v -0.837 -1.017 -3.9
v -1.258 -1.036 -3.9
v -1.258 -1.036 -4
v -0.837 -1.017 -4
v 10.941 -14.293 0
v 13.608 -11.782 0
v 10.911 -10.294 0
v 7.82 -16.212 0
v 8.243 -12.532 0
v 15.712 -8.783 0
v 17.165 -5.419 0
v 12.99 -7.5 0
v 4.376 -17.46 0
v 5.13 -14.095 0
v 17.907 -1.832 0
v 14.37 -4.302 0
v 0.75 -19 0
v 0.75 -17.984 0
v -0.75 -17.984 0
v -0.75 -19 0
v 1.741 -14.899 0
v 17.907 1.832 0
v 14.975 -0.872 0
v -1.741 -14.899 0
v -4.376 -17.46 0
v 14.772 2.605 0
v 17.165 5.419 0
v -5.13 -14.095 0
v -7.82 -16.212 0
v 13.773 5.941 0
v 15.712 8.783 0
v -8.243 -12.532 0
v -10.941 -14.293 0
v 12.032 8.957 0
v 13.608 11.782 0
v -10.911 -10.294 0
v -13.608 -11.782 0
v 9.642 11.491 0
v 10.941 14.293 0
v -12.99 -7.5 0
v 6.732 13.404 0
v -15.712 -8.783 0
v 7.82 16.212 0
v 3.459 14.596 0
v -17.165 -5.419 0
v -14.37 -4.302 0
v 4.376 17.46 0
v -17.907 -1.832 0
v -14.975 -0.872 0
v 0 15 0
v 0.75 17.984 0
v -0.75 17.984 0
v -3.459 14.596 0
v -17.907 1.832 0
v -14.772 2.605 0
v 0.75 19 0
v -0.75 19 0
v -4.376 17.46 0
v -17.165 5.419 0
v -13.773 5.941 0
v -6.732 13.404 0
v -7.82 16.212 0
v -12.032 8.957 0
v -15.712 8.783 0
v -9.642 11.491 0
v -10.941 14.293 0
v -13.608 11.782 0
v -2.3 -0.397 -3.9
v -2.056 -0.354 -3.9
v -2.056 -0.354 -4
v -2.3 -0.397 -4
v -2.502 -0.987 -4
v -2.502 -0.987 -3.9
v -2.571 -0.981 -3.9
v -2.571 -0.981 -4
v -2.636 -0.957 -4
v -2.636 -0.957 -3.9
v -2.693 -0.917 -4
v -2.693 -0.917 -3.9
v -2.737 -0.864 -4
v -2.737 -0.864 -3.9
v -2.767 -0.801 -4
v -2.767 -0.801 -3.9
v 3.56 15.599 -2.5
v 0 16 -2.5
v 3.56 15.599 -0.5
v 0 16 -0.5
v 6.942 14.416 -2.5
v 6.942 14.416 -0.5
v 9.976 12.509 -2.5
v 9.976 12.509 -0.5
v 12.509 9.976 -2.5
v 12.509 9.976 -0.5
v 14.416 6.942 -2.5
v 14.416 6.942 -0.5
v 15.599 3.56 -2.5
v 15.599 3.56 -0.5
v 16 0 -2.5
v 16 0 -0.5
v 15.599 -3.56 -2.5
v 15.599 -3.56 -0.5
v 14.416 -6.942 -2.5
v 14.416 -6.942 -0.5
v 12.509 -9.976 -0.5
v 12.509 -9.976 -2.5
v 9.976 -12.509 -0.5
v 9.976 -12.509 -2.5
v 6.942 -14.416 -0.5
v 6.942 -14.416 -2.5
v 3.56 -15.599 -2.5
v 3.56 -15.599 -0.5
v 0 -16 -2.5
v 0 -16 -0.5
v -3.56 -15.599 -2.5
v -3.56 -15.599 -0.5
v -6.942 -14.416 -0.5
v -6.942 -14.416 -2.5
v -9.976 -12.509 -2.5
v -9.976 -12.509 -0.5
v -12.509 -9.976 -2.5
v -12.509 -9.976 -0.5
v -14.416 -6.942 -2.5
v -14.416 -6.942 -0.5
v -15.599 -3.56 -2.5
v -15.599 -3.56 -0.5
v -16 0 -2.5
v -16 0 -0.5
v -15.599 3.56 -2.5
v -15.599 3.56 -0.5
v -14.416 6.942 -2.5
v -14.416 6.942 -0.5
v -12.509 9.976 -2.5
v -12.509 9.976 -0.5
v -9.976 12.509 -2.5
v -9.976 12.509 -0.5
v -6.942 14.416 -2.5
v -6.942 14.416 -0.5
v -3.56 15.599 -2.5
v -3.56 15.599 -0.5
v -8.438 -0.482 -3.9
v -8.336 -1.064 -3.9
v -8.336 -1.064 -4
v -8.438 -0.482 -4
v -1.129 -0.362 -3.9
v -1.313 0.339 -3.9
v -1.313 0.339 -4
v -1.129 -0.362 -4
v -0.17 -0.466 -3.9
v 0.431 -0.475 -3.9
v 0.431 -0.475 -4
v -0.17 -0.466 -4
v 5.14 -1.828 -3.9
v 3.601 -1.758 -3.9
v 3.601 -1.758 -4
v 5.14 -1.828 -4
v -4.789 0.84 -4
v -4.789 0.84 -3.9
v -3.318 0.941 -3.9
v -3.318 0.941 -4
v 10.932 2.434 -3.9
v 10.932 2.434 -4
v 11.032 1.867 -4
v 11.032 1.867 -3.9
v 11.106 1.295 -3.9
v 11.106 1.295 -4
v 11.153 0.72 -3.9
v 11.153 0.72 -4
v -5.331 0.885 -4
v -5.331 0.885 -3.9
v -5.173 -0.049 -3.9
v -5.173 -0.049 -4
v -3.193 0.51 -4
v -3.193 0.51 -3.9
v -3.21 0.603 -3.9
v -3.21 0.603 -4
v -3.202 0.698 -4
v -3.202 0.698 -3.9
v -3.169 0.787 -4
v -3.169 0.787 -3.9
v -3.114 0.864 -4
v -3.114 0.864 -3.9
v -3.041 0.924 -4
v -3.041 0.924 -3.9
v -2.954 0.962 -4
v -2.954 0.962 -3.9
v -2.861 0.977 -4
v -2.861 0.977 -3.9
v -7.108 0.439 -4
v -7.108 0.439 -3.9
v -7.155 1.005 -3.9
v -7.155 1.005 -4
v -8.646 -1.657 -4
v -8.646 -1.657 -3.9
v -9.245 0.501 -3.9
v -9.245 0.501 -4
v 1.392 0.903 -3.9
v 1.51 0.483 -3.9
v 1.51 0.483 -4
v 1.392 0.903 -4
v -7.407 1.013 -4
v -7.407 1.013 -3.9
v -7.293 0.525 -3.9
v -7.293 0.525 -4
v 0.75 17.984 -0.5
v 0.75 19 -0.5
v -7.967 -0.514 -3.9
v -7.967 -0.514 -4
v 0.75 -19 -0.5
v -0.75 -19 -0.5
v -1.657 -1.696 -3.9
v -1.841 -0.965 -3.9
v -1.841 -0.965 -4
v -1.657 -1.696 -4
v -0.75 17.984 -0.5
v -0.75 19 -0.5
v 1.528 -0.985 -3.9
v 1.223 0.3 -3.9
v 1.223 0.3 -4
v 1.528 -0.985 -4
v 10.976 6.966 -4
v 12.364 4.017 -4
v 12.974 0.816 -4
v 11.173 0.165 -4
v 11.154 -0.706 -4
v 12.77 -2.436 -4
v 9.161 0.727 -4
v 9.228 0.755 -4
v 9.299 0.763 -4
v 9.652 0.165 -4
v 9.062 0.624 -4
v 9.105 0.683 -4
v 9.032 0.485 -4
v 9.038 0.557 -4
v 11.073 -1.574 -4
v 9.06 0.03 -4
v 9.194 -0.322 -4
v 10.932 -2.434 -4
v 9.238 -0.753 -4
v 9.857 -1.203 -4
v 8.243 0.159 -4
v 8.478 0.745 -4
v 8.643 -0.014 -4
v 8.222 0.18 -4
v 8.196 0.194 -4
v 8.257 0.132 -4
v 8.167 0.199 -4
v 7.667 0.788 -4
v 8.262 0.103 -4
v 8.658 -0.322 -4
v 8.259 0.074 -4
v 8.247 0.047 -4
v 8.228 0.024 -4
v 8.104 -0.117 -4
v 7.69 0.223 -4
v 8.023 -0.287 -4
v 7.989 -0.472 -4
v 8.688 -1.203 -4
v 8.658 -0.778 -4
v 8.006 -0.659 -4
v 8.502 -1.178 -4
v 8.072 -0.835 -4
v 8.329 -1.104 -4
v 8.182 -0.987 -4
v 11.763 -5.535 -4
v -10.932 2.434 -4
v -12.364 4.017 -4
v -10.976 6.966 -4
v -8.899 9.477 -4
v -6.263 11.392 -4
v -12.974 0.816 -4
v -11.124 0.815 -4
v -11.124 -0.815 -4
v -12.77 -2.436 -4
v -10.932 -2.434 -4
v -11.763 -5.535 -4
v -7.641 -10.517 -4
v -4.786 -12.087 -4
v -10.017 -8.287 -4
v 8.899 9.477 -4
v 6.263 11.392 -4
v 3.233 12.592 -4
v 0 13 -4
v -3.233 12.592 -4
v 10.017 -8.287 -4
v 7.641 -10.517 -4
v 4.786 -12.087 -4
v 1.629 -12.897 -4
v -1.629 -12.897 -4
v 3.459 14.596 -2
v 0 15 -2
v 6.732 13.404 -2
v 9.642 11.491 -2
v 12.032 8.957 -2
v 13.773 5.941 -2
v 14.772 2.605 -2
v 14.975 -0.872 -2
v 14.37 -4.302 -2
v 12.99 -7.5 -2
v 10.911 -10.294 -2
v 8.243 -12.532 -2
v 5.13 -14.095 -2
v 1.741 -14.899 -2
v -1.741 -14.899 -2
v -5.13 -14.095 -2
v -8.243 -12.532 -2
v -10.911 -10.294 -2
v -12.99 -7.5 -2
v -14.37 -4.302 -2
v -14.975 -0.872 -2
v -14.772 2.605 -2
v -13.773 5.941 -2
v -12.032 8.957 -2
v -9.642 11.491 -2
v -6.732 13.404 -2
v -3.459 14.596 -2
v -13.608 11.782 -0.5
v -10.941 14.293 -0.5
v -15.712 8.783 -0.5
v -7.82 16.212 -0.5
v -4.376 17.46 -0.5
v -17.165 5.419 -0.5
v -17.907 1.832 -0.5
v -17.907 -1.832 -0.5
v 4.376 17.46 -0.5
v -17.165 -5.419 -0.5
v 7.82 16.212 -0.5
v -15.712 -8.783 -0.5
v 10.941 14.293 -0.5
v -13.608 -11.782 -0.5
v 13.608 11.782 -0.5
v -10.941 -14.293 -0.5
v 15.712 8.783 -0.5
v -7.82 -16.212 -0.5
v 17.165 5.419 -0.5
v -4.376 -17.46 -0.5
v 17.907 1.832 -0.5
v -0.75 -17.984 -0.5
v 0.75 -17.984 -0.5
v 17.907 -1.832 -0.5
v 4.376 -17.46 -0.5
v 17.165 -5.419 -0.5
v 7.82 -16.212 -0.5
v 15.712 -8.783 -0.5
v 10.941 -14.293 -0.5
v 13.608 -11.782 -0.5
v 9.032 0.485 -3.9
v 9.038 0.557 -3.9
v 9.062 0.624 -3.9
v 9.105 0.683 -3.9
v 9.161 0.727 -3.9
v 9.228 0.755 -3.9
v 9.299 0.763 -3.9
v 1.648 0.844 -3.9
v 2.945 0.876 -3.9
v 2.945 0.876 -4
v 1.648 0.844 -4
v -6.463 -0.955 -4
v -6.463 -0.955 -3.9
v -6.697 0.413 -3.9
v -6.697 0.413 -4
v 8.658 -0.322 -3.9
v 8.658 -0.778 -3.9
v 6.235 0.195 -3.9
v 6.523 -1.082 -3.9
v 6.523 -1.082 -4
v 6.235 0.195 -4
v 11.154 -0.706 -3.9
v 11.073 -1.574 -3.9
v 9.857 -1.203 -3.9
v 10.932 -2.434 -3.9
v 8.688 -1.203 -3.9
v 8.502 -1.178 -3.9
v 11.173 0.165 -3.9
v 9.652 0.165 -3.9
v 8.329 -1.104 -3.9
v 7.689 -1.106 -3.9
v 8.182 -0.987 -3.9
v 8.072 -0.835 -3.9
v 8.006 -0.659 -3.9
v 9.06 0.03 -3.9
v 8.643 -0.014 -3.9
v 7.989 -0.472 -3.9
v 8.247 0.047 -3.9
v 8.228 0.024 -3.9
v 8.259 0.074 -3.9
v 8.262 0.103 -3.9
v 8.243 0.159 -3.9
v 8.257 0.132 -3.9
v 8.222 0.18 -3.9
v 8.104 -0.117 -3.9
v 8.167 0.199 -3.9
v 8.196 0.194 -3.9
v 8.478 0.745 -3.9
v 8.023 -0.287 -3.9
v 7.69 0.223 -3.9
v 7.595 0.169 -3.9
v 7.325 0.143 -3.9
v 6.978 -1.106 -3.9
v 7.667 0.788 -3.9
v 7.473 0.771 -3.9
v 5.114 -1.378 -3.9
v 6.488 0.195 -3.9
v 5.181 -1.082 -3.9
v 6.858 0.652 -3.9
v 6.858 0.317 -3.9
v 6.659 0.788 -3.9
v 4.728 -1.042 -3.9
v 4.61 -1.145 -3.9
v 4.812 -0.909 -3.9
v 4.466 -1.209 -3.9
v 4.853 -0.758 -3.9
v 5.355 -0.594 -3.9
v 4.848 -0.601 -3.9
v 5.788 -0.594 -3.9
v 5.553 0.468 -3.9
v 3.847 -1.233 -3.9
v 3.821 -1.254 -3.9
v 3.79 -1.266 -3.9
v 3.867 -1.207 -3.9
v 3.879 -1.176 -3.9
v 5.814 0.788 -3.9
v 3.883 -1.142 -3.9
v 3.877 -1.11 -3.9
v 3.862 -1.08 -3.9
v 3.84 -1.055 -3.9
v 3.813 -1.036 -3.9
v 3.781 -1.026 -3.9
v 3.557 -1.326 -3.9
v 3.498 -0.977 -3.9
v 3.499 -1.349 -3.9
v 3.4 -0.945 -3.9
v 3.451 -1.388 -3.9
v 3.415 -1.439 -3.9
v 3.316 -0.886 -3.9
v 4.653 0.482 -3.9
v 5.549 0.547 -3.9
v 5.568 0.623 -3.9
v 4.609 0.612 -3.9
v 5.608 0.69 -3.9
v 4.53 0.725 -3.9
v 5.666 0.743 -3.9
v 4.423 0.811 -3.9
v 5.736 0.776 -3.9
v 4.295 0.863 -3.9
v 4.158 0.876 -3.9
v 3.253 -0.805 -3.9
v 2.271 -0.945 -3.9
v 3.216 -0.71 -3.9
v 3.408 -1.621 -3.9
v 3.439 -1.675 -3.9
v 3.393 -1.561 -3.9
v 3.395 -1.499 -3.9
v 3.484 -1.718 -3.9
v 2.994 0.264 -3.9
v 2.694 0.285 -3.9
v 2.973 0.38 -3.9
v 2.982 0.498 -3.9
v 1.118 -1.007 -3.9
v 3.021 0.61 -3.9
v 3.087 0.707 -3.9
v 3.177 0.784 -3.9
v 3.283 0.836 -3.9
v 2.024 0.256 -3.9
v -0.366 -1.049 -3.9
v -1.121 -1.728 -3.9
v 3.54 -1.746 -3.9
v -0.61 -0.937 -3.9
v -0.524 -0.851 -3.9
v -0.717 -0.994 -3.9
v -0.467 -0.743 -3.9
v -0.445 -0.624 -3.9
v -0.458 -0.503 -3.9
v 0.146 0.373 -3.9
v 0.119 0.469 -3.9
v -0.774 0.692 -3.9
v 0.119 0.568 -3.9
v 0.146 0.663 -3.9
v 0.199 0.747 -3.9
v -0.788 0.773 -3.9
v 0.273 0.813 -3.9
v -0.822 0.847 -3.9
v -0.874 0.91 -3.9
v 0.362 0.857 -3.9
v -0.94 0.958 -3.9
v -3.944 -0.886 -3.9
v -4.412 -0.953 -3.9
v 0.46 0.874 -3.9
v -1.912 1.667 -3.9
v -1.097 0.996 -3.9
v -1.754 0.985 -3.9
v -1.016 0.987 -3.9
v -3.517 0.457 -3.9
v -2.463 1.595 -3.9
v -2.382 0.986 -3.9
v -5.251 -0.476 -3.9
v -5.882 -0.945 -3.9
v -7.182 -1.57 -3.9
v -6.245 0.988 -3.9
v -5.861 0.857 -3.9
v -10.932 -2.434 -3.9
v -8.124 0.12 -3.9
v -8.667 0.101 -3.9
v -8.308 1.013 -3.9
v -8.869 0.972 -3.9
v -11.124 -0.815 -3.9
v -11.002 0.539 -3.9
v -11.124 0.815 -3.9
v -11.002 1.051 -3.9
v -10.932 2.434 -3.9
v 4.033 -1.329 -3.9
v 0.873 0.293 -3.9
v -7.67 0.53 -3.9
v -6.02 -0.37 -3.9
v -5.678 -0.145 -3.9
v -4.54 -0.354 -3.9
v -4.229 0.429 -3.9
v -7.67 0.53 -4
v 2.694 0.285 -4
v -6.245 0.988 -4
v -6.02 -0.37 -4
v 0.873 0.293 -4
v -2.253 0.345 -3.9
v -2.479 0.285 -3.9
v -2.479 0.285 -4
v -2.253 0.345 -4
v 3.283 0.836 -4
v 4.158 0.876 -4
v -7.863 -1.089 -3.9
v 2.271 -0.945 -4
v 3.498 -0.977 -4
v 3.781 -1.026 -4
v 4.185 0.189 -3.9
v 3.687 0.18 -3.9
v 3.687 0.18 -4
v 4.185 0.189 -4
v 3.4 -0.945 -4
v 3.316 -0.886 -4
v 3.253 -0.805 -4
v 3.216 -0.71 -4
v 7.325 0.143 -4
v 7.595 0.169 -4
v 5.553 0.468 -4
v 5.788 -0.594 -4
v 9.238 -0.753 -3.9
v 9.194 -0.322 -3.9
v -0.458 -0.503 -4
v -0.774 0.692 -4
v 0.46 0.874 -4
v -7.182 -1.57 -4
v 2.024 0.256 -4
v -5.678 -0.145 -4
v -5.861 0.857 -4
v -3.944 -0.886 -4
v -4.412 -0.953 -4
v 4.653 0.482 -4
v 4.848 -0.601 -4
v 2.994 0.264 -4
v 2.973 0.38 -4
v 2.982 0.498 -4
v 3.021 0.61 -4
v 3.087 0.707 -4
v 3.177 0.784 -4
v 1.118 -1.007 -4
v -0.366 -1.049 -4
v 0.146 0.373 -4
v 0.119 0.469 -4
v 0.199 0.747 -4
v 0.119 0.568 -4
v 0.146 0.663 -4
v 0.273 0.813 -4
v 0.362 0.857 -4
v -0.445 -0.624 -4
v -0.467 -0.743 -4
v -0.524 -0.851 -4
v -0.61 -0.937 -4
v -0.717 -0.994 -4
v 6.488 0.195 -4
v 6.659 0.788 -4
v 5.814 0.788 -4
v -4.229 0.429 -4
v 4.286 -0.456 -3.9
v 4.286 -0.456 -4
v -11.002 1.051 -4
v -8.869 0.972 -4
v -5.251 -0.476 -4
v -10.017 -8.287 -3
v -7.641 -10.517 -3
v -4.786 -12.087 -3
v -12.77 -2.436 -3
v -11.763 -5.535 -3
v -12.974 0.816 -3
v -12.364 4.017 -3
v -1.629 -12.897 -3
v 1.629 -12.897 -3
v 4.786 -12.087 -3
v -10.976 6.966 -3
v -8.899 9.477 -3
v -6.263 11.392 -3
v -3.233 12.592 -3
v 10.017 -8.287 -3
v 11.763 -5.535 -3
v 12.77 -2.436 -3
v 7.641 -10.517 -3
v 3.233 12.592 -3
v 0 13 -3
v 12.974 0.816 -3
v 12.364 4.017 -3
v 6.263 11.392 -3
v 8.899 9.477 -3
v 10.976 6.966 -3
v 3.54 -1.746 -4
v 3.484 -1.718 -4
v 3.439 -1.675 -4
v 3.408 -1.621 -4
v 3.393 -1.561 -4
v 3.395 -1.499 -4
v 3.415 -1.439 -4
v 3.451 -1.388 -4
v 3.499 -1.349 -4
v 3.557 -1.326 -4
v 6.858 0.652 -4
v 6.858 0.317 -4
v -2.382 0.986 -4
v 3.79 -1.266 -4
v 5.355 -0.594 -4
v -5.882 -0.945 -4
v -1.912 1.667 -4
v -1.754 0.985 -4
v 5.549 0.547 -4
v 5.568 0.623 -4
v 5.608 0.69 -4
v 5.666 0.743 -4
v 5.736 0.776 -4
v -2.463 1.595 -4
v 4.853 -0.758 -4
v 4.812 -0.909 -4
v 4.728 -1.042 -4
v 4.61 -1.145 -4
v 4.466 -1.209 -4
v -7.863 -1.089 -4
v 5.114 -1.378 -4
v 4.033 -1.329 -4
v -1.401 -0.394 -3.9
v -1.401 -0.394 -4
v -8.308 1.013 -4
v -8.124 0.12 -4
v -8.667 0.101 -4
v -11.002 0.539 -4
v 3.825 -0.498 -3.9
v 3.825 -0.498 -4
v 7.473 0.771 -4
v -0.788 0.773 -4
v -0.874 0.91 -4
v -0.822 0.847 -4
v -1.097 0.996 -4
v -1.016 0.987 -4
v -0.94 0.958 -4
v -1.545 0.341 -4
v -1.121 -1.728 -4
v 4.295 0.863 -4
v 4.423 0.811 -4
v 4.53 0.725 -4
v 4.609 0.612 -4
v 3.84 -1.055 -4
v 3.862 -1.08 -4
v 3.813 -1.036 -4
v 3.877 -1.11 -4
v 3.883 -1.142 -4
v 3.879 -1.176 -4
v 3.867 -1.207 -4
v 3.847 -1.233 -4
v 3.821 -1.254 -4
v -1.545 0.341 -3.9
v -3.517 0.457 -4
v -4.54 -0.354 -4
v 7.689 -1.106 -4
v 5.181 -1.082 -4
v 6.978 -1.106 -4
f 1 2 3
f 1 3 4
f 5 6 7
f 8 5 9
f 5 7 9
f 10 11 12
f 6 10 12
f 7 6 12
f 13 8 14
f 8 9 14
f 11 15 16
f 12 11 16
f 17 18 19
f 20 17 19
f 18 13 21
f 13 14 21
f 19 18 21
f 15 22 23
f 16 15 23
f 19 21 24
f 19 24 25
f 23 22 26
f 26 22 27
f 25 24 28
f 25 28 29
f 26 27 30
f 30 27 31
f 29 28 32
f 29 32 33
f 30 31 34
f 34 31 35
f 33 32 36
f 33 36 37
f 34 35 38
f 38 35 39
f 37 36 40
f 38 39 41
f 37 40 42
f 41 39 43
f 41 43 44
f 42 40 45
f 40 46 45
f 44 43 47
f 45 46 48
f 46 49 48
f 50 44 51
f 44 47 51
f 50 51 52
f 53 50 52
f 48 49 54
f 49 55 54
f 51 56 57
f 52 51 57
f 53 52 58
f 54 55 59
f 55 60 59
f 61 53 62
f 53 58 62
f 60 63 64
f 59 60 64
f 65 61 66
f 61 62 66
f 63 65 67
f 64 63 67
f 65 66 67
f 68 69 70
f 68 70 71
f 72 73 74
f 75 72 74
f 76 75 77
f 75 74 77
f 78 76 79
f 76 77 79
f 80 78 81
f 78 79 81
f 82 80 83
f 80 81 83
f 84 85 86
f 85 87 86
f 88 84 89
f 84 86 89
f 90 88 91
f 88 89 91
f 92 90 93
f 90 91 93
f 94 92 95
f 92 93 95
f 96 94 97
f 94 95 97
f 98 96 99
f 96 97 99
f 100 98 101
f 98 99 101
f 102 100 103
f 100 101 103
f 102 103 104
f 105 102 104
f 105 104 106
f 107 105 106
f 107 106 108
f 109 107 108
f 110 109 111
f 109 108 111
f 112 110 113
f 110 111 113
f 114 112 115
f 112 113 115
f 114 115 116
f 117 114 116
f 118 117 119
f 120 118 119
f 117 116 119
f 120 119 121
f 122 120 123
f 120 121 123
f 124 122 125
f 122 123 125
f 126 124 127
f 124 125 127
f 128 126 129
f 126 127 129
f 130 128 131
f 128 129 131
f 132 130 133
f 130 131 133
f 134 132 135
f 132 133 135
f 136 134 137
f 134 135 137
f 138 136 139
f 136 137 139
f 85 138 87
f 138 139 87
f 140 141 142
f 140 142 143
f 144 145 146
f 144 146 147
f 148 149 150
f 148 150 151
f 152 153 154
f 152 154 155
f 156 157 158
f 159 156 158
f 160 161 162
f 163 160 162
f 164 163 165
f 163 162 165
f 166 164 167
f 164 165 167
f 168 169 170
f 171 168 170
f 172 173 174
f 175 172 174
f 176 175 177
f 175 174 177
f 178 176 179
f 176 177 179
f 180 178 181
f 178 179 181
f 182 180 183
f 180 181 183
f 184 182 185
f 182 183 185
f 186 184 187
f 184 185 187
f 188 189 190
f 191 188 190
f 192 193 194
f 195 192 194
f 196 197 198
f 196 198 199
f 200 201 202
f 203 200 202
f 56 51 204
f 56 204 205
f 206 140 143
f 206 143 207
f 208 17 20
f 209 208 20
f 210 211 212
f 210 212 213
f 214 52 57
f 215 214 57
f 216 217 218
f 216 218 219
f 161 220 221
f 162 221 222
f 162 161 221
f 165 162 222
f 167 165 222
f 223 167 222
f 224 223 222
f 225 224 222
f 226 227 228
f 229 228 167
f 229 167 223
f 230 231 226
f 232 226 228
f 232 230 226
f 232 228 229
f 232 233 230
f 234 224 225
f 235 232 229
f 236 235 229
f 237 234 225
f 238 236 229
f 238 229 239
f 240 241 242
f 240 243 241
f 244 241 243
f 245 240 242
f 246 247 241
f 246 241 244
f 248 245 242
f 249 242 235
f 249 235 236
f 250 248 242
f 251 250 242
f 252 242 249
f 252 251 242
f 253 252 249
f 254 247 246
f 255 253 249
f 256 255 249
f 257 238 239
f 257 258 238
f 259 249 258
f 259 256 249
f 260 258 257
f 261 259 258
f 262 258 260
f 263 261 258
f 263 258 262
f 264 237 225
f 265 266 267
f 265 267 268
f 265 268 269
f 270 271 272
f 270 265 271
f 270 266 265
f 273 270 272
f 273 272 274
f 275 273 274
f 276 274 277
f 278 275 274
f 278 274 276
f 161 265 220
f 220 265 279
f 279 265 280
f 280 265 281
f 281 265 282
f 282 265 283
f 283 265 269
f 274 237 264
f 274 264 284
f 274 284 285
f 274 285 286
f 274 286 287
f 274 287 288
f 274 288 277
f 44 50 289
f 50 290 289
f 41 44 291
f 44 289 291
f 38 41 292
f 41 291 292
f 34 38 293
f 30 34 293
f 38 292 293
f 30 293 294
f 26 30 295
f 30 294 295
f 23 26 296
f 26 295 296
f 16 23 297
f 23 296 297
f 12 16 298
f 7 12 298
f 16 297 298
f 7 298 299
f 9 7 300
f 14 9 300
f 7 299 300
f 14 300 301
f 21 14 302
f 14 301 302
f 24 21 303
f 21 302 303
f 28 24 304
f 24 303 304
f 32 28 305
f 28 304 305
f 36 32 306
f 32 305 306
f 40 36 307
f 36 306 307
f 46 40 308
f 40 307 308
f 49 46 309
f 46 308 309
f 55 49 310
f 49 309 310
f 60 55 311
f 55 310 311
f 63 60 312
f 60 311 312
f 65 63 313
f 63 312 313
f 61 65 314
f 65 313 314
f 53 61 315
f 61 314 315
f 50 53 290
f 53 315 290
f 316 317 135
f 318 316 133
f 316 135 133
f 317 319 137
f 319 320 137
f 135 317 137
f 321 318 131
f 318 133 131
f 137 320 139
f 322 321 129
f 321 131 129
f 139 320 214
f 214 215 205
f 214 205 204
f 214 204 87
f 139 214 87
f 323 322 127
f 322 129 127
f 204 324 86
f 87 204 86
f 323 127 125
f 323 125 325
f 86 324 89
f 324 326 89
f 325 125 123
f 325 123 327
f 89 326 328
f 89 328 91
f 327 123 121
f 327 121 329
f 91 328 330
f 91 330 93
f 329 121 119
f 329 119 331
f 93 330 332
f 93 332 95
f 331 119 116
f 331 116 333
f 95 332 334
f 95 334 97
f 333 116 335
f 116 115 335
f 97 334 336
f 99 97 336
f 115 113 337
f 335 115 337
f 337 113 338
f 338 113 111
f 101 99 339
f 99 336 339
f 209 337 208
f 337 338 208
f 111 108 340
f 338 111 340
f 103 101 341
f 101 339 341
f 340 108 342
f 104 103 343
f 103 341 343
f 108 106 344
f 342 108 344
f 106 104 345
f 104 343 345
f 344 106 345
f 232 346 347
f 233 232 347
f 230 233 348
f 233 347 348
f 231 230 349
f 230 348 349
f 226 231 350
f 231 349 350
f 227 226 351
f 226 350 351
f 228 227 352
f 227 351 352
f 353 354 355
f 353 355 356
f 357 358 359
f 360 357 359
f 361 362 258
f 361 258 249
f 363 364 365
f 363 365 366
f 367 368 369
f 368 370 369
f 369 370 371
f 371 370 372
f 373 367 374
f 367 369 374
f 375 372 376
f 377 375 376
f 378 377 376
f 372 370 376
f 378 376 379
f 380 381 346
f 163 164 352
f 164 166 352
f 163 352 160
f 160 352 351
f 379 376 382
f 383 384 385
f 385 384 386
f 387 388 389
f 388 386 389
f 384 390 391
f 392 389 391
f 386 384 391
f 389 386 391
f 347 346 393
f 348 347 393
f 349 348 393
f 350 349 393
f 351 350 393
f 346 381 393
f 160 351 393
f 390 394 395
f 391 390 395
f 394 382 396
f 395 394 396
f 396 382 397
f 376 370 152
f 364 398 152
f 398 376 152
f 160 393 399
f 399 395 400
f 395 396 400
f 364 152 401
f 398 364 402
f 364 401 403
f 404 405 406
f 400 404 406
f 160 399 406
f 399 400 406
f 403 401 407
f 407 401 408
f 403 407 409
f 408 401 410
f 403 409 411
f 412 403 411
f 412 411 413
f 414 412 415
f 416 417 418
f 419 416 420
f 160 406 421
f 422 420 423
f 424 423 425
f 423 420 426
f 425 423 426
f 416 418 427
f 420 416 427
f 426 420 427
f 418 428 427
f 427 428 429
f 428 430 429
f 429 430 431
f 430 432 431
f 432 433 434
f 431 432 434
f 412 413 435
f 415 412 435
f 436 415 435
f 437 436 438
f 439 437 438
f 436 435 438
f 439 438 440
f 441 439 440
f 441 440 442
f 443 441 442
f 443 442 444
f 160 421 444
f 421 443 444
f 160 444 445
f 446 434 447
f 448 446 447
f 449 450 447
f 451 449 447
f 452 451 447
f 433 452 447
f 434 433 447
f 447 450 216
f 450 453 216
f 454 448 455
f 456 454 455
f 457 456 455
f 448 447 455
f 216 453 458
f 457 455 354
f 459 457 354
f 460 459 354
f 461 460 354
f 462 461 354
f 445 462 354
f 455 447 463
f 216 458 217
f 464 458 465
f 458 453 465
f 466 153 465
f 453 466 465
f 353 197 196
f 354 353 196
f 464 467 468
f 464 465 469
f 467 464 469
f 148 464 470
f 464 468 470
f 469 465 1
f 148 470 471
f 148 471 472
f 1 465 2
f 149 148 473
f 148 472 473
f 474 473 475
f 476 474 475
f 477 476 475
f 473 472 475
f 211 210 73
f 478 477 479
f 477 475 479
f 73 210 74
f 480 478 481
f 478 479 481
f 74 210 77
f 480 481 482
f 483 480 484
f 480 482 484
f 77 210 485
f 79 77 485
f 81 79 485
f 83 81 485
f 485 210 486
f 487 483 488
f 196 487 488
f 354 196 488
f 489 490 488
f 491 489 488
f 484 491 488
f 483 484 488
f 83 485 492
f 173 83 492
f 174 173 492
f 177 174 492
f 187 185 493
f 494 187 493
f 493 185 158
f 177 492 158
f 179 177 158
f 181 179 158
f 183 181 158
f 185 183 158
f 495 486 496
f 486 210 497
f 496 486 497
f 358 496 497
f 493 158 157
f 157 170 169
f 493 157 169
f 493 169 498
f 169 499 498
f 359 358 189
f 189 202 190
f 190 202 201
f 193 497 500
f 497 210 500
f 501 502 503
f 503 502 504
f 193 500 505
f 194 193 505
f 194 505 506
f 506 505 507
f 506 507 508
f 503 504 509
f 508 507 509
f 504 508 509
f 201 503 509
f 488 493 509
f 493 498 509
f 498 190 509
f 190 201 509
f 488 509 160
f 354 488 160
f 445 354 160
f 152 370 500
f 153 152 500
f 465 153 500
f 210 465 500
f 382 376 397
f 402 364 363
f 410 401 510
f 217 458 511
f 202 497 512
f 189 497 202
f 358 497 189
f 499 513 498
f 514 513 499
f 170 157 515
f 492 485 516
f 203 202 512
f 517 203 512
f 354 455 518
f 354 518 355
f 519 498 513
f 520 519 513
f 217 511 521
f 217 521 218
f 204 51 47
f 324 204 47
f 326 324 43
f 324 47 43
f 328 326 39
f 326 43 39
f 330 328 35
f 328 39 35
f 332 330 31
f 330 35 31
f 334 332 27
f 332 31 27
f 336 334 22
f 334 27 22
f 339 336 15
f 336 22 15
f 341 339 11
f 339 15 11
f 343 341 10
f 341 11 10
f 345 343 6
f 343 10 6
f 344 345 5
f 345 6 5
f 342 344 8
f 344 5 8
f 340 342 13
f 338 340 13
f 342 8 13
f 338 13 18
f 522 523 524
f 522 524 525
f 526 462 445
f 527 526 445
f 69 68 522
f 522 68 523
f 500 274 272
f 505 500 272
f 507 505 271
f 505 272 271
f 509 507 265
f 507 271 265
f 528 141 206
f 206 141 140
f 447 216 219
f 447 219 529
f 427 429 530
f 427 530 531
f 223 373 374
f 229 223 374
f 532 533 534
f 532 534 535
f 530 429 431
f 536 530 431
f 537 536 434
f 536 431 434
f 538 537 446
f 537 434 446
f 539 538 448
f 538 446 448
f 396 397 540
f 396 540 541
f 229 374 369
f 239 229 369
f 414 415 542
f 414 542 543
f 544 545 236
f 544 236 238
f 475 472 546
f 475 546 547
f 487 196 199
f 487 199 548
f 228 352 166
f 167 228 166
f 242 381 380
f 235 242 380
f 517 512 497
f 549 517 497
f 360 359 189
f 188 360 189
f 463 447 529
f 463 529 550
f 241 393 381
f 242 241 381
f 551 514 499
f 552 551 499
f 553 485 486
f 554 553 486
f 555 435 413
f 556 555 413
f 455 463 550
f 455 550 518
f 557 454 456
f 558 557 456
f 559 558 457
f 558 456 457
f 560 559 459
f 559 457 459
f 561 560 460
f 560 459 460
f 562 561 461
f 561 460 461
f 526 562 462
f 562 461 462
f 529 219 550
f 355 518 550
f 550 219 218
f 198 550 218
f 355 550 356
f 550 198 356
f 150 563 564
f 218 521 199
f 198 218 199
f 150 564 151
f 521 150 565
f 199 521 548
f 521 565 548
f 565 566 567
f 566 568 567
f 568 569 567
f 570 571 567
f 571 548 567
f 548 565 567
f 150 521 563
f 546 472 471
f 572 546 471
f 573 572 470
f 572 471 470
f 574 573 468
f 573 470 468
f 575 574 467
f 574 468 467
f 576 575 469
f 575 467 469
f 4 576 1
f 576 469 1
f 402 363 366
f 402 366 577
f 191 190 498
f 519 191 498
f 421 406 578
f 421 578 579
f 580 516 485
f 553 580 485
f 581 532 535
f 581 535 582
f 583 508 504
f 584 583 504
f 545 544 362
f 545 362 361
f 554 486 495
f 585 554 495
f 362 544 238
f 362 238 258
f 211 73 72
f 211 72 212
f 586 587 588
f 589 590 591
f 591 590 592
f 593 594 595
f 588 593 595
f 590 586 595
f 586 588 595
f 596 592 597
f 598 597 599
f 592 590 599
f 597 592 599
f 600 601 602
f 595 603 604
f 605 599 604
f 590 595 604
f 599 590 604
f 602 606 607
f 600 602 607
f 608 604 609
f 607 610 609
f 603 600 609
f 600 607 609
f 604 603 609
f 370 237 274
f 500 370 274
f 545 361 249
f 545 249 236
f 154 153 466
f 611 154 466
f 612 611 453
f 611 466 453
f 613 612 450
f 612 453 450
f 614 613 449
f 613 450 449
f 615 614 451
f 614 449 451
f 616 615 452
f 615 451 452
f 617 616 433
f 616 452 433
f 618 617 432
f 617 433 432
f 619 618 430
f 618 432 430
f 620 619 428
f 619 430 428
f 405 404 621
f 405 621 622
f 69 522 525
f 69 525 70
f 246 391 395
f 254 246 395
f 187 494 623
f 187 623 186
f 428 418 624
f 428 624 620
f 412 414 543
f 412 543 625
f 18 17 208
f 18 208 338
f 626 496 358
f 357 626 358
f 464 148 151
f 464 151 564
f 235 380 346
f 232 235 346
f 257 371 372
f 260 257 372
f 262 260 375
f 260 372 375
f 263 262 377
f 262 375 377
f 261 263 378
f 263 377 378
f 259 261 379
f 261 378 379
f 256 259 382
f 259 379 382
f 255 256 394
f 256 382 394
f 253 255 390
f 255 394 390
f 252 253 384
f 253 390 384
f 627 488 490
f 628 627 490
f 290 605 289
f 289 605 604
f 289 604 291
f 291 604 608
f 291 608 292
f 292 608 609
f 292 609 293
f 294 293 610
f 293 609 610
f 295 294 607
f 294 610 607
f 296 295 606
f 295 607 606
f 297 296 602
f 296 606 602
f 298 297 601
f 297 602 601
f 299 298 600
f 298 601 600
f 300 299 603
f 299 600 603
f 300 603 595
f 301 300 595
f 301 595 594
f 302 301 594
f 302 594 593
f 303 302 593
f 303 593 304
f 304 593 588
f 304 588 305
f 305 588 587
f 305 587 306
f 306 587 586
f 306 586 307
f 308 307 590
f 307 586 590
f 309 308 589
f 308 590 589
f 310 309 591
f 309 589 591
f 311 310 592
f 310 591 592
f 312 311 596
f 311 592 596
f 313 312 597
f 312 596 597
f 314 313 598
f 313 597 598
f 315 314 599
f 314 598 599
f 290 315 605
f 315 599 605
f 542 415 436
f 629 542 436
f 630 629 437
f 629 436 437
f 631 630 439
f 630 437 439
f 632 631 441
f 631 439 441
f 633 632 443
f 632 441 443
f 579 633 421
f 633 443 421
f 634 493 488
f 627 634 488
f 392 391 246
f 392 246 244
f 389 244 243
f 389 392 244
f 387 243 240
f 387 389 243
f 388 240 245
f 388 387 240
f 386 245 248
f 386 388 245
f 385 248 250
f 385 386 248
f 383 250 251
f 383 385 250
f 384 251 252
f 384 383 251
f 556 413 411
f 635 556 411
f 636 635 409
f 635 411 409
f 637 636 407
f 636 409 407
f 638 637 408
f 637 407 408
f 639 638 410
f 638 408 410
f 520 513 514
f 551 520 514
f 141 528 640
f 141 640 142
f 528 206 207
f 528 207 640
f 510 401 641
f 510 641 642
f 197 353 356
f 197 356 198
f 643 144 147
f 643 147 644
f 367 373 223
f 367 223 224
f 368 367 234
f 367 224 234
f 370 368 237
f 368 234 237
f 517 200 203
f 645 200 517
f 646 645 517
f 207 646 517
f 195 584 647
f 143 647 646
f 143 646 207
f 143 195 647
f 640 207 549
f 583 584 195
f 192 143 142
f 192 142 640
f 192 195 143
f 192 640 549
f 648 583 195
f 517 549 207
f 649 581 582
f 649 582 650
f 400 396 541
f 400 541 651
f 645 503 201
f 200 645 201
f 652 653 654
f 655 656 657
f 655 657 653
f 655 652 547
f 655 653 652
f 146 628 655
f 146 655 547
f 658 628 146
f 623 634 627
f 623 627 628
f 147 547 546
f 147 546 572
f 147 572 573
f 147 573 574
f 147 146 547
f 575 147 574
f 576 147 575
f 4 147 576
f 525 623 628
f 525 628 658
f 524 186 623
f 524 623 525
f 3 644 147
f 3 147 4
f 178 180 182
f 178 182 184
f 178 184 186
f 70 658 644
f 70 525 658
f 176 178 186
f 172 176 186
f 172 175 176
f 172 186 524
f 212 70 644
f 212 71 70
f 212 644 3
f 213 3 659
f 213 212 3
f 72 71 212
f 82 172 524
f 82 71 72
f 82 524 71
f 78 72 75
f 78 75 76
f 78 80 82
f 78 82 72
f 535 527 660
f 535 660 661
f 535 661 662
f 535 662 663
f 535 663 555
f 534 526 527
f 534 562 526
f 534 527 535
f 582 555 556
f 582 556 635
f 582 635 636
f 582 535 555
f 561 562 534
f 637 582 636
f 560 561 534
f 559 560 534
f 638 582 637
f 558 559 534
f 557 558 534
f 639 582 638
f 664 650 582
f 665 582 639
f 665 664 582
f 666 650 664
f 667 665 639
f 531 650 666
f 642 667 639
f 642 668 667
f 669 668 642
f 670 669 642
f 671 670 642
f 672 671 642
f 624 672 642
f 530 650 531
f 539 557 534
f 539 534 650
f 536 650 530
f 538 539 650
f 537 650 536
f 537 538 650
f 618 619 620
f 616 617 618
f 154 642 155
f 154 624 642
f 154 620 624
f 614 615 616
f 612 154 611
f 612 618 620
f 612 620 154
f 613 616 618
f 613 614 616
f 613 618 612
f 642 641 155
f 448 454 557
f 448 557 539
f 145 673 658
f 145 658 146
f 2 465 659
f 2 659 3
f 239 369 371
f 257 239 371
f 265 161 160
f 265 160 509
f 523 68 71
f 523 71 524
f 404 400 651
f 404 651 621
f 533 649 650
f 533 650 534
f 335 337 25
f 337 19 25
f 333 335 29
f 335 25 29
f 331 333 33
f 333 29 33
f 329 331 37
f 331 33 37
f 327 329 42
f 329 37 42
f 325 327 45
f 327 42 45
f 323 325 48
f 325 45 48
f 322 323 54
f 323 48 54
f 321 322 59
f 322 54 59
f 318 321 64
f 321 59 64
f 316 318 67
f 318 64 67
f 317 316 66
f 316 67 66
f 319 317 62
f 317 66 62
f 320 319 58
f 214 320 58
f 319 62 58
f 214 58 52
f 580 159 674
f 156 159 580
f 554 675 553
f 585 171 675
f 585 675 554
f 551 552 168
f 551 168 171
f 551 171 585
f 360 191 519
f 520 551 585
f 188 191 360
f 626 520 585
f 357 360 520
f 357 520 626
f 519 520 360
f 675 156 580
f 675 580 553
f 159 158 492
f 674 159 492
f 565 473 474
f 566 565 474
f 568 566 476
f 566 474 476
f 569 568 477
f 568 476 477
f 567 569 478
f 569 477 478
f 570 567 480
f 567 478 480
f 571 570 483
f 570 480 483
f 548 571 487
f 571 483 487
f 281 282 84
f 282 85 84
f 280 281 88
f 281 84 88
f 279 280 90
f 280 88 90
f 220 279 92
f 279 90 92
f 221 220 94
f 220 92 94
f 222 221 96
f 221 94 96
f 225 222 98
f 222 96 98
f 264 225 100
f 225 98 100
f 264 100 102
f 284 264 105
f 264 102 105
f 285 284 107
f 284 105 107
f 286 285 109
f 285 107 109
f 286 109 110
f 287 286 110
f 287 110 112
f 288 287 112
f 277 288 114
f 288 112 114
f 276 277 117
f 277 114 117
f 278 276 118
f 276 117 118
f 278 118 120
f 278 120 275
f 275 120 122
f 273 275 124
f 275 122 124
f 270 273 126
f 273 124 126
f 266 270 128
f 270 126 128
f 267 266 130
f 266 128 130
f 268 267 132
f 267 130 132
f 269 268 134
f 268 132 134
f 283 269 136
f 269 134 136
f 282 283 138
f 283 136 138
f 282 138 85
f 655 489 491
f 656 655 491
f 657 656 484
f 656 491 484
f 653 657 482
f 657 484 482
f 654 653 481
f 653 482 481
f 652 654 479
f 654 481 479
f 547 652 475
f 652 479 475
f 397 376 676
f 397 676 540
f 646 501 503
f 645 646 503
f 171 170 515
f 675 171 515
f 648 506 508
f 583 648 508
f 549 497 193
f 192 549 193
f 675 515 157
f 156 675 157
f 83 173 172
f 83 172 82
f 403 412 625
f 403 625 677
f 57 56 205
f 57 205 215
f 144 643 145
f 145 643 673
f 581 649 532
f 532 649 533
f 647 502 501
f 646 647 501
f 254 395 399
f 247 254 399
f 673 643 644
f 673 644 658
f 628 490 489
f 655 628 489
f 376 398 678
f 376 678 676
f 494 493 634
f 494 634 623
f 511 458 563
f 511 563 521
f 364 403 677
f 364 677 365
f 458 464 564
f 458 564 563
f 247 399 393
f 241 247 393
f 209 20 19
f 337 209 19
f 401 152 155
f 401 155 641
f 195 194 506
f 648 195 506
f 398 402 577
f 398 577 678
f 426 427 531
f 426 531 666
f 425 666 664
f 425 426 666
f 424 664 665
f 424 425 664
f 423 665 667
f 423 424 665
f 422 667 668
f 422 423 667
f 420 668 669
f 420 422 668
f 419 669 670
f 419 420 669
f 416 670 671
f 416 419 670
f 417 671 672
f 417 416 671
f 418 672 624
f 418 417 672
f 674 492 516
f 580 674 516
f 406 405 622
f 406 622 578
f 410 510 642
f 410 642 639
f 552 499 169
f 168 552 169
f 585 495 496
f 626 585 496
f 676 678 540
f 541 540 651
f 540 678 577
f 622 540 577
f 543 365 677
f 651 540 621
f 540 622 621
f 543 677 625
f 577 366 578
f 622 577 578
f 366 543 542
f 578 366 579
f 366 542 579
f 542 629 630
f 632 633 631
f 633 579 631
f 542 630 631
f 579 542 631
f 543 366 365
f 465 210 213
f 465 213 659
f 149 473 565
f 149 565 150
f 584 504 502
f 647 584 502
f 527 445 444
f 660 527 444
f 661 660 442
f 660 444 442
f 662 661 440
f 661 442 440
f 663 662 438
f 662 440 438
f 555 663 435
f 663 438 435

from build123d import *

# Parameters (mm, degrees)
SKETCH019_W             = 1.5
SKETCH019_H             = 1.25
PAD002_DEPTH            = 0.5
POCKET_DEPTH            = 0.1
PAD_DEPTH               = 0.1
BODY002_PLACEMENT_ANGLE = 180


with BuildPart() as part:
    # Sketch018 → Revolution002 (revolve)
    with BuildSketch(Plane.YZ):
        Polygon((0, 3), (0, 4), (13, 4), (16, 2.5), (16, 0.5), (18, 0.5), (18, 0), (15, 0), (15, 2), (13, 3), align=None)
    revolve(axis=Axis((0, 0, 0), (0, 0, 1)))

    # Sketch019 → Pad002 (new body)
    with BuildSketch(Plane.XY):
        with Locations((0, 18.375)):
            Rectangle(SKETCH019_W, SKETCH019_H)
        with Locations((0, -18.375)):
            Rectangle(SKETCH019_W, SKETCH019_H)
    extrude(amount=PAD002_DEPTH)

    # Sketch020 (on Face10 of Pad002) → Pocket (cut)
    with BuildSketch(Plane(origin=(0, 0, 4), x_dir=(0, -1, 0), z_dir=(0, 0, 1))):
        with BuildLine():
            Line((-2.434491, -10.93226), (-2.434491, 10.93226))
            ThreePointArc((2.434491, 10.93226), (0, 11.148441), (-2.434491, 10.93226))
            Line((2.434491, -10.93226), (2.434491, 10.93226))
            ThreePointArc((-2.434491, -10.93226), (0, -11.17381), (2.434491, -10.93226))
        make_face()
    extrude(amount=-POCKET_DEPTH, mode=Mode.SUBTRACT)

    # Sketch021 (on Face21 of Pocket) → Pad (join)
    with BuildSketch(Plane(origin=(0, 0, 3.9), x_dir=(0, -1, 0), z_dir=(0, 0, 1))):
        Polygon((-1.051088, 11.002361), (-0.972425, 8.869409), (-0.10063, 8.667482), (-0.120028, 8.124363), (-1.012698, 8.308082), (-1.012698, 7.40667), (-0.525367, 7.293473), (-0.530311, 7.669809), (1.570168, 7.181732), (1.657325, 8.645967), (-0.50107, 9.244894), (-0.538989, 11.002361), align=None)
        Polygon((0.481582, 8.438001), (0.513538, 7.966647), (1.08875, 7.862789), (1.064194, 8.335846), align=None, mode=Mode.SUBTRACT)
        Polygon((-1.004575, 7.154918), (-0.988205, 6.244779), (0.36954, 6.020473), (0.144834, 5.678259), (-0.85747, 5.861289), (-0.8847, 5.331025), (0.048961, 5.17275), (0.353603, 4.54011), (-0.840038, 4.78926), (-0.940623, 3.317786), (-0.456548, 3.51677), (-0.429325, 4.228536), (0.885667, 3.943839), (0.952781, 4.412285), (0.476029, 5.251191), (0.944792, 5.882269), (0.955392, 6.46267), (-0.413346, 6.697153), (-0.439117, 7.107631), align=None)
        with BuildLine():
            Line((-1.595326, 2.463415), (-1.667228, 1.912171))
            Line((-1.667228, 1.912171), (-0.98497, 1.753897))
            Line((-0.98497, 1.753897), (-0.996148, 1.097288))
            ThreePointArc((-0.996148, 1.097288), (-0.909931, 0.873883), (-0.692449, 0.773661))
            Line((0.502626, 0.457906), (-0.692449, 0.773661))
            ThreePointArc((0.502626, 0.457906), (0.850751, 0.524173), (1.017488, 0.836872))
            Line((1.035793, 1.257814), (1.017488, 0.836872))
            Line((1.728117, 1.121255), (1.035793, 1.257814))
            Line((1.696161, 1.656521), (1.728117, 1.121255))
            Line((0.964921, 1.841128), (1.696161, 1.656521))
            Line((0.987336, 2.501678), (0.964921, 1.841128))
            ThreePointArc((0.987336, 2.501678), (0.938708, 2.665418), (0.801388, 2.766999))
            Line((-0.509837, 3.193234), (0.801388, 2.766999))
            ThreePointArc((-0.509837, 3.193234), (-0.8271, 3.14454), (-0.976837, 2.860628))
            Line((-0.98581, 2.38212), (-0.976837, 2.860628))
            Line((-1.595326, 2.463415), (-0.98581, 2.38212))
        make_face()
        Polygon((-0.285122, 2.479393), (-0.344921, 2.25341), (0.354001, 2.055974), (0.39705, 2.300148), align=None, mode=Mode.SUBTRACT)
        Polygon((-0.341045, 1.544675), (-0.339079, 1.3128), (0.361991, 1.129244), (0.393947, 1.400872), align=None, mode=Mode.SUBTRACT)
        with BuildLine():
            Line((-0.373136, -0.145754), (0.474852, -0.431454))
            Line((0.474852, -0.431454), (0.466107, 0.169897))
            Line((0.466107, 0.169897), (1.048914, 0.365545))
            Line((1.048914, 0.365545), (1.007425, -1.117984))
            Line((1.007425, -1.117984), (-0.293246, -0.872757))
            Line((-0.293246, -0.872757), (-0.299928, -1.222572))
            Line((-0.299928, -1.222572), (0.985002, -1.527859))
            Line((0.985002, -1.527859), (0.945056, -2.27084))
            Line((0.945056, -2.27084), (-0.256349, -2.024415))
            Line((-0.256349, -2.024415), (-0.285257, -2.69426))
            Line((-0.285257, -2.69426), (-0.876366, -2.944678))
            Line((-0.876366, -2.944678), (-0.84449, -1.647695))
            Line((-0.84449, -1.647695), (-0.482957, -1.510189))
            Line((-0.482957, -1.510189), (-0.903417, -1.392168))
            Line((-0.903417, -1.392168), (-0.873512, -0.459889))
            ThreePointArc((-0.373136, -0.145754), (-0.706912, -0.169676), (-0.873512, -0.459889))
        make_face()
        with BuildLine():
            Line((-0.836017, -3.282908), (-0.876294, -4.157938))
            ThreePointArc((-0.876294, -4.157938), (-0.771967, -4.479652), (-0.481546, -4.652971))
            Line((-0.481546, -4.652971), (0.600982, -4.848248))
            ThreePointArc((0.600982, -4.848248), (0.978895, -4.775046), (1.208734, -4.466256))
            Line((1.328705, -4.032862), (1.208734, -4.466256))
            Line((1.377683, -5.114136), (1.328705, -4.032862))
            Line((1.827564, -5.140406), (1.377683, -5.114136))
            Line((1.757688, -3.601044), (1.827564, -5.140406))
            ThreePointArc((1.757688, -3.601044), (1.560758, -3.392599), (1.325631, -3.556752))
            Line((1.266093, -3.790237), (1.325631, -3.556752))
            ThreePointArc((1.026349, -3.780899), (1.142446, -3.882509), (1.266093, -3.790237))
            Line((0.977187, -3.497595), (1.026349, -3.780899))
            ThreePointArc((0.977187, -3.497595), (0.886029, -3.316179), (0.709587, -3.21573))
            Line((-0.263959, -2.994211), (0.709587, -3.21573))
            ThreePointArc((-0.263959, -2.994211), (-0.609501, -3.020633), (-0.836017, -3.282908))
        make_face()
        Polygon((-0.179772, -3.687321), (-0.189214, -4.184654), (0.456341, -4.285789), (0.497845, -3.825146), align=None, mode=Mode.SUBTRACT)
        with BuildLine():
            Line((-0.468422, -5.552885), (0.594216, -5.787834))
            Line((0.594216, -5.787834), (0.594216, -5.355098))
            Line((0.594216, -5.355098), (1.081549, -5.180666))
            Line((1.081549, -5.180666), (1.081549, -6.522826))
            Line((1.081549, -6.522826), (-0.195384, -6.235382))
            Line((-0.195384, -6.235382), (-0.195384, -6.488137))
            Line((-0.195384, -6.488137), (1.105516, -6.978201))
            Line((1.105516, -6.978201), (1.105516, -7.689227))
            Line((1.105516, -7.689227), (-0.14309, -7.324843))
            Line((-0.14309, -7.324843), (-0.169237, -7.595029))
            Line((-0.169237, -7.595029), (-0.770619, -7.47301))
            Line((-0.770619, -7.47301), (-0.652075, -6.858366))
            Line((-0.652075, -6.858366), (-0.317403, -6.858366))
            Line((-0.317403, -6.858366), (-0.787888, -6.658639))
            Line((-0.787888, -6.658639), (-0.787888, -5.814008))
            ThreePointArc((-0.468422, -5.552885), (-0.690064, -5.607705), (-0.787888, -5.814008))
        make_face()
        with BuildLine():
            Line((-0.788226, -7.667088), (-0.744648, -8.477647))
            Line((-0.744648, -8.477647), (0.013617, -8.643245))
            Line((0.013617, -8.643245), (-0.029888, -9.060359))
            Line((-0.029888, -9.060359), (-0.485137, -9.032119))
            ThreePointArc((-0.485137, -9.032119), (-0.682705, -9.10468), (-0.76291, -9.299271))
            Line((-0.76291, -9.299271), (-0.718502, -11.231683))
            Line((-0.718502, -11.231683), (-0.165053, -11.231683))
            Line((-0.165053, -11.231683), (-0.165053, -9.65233))
            Line((-0.165053, -9.65233), (1.203263, -9.857344))
            Line((1.203263, -9.857344), (1.203263, -8.688368))
            ThreePointArc((1.203263, -8.688368), (0.748997, -8.032918), (-0.024208, -8.228178))
            ThreePointArc((-0.199438, -8.167384), (-0.132338, -8.256913), (-0.024208, -8.228178))
            Line((-0.199438, -8.167384), (-0.223065, -7.690382))
            Line((-0.223065, -7.690382), (-0.788226, -7.667088))
        make_face()
        Polygon((0.322334, -8.658413), (0.322334, -9.193679), (0.753406, -9.23806), (0.77771, -8.658413), align=None, mode=Mode.SUBTRACT)
    extrude(amount=PAD_DEPTH)


with BuildPart() as part_1:
    # Body002 placement: moved
    add(part.part.moved(Location((0, 0, 0))).rotate(Axis((0, 0, 0), (0, 1, 0)), BODY002_PLACEMENT_ANGLE))


solid = part_1.part
